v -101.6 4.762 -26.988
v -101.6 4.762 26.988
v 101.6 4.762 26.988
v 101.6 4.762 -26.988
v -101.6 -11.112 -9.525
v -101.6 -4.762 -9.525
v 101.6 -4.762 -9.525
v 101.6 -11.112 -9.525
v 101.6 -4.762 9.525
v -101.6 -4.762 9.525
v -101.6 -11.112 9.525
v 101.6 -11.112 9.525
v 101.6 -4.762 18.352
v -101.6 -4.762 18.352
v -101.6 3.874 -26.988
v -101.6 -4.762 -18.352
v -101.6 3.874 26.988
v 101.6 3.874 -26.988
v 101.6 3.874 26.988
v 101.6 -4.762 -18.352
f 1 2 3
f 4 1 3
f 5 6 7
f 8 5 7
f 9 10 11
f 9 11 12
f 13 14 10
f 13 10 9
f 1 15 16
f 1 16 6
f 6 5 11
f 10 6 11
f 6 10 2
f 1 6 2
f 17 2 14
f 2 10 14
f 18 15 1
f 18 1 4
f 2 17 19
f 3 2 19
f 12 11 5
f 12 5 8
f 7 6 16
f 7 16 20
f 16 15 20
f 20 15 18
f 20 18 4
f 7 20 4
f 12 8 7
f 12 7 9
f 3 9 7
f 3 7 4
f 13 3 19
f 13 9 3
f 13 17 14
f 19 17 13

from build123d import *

# Parameters (mm, degrees)
F0_W     = 203.2
F0_H     = 53.975
F1_DEPTH = 4.7625
F2_SIZE  = 8.636
F3_W     = 203.2
F3_H     = 19.05
F4_DEPTH = 6.35


with BuildPart() as f1:
    # F0 (on Front) → F1 (new body, symmetric)
    with BuildSketch(Plane.XZ):
        Rectangle(F0_W, F0_H)
    extrude(amount=F1_DEPTH, both=True)

    # F2
    f2_edges = [f1.edges().sort_by_distance(p)[0] for p in [
        (0, -4.7625, 26.9875),
        (0, -4.7625, -26.9875),
    ]]
    chamfer(f2_edges, length=F2_SIZE)

    # F3 (on face) → F4 (join)
    with BuildSketch(Plane.XZ.offset(4.7625)):
        Rectangle(F3_W, F3_H)
    extrude(amount=F4_DEPTH)


solid = f1.part
